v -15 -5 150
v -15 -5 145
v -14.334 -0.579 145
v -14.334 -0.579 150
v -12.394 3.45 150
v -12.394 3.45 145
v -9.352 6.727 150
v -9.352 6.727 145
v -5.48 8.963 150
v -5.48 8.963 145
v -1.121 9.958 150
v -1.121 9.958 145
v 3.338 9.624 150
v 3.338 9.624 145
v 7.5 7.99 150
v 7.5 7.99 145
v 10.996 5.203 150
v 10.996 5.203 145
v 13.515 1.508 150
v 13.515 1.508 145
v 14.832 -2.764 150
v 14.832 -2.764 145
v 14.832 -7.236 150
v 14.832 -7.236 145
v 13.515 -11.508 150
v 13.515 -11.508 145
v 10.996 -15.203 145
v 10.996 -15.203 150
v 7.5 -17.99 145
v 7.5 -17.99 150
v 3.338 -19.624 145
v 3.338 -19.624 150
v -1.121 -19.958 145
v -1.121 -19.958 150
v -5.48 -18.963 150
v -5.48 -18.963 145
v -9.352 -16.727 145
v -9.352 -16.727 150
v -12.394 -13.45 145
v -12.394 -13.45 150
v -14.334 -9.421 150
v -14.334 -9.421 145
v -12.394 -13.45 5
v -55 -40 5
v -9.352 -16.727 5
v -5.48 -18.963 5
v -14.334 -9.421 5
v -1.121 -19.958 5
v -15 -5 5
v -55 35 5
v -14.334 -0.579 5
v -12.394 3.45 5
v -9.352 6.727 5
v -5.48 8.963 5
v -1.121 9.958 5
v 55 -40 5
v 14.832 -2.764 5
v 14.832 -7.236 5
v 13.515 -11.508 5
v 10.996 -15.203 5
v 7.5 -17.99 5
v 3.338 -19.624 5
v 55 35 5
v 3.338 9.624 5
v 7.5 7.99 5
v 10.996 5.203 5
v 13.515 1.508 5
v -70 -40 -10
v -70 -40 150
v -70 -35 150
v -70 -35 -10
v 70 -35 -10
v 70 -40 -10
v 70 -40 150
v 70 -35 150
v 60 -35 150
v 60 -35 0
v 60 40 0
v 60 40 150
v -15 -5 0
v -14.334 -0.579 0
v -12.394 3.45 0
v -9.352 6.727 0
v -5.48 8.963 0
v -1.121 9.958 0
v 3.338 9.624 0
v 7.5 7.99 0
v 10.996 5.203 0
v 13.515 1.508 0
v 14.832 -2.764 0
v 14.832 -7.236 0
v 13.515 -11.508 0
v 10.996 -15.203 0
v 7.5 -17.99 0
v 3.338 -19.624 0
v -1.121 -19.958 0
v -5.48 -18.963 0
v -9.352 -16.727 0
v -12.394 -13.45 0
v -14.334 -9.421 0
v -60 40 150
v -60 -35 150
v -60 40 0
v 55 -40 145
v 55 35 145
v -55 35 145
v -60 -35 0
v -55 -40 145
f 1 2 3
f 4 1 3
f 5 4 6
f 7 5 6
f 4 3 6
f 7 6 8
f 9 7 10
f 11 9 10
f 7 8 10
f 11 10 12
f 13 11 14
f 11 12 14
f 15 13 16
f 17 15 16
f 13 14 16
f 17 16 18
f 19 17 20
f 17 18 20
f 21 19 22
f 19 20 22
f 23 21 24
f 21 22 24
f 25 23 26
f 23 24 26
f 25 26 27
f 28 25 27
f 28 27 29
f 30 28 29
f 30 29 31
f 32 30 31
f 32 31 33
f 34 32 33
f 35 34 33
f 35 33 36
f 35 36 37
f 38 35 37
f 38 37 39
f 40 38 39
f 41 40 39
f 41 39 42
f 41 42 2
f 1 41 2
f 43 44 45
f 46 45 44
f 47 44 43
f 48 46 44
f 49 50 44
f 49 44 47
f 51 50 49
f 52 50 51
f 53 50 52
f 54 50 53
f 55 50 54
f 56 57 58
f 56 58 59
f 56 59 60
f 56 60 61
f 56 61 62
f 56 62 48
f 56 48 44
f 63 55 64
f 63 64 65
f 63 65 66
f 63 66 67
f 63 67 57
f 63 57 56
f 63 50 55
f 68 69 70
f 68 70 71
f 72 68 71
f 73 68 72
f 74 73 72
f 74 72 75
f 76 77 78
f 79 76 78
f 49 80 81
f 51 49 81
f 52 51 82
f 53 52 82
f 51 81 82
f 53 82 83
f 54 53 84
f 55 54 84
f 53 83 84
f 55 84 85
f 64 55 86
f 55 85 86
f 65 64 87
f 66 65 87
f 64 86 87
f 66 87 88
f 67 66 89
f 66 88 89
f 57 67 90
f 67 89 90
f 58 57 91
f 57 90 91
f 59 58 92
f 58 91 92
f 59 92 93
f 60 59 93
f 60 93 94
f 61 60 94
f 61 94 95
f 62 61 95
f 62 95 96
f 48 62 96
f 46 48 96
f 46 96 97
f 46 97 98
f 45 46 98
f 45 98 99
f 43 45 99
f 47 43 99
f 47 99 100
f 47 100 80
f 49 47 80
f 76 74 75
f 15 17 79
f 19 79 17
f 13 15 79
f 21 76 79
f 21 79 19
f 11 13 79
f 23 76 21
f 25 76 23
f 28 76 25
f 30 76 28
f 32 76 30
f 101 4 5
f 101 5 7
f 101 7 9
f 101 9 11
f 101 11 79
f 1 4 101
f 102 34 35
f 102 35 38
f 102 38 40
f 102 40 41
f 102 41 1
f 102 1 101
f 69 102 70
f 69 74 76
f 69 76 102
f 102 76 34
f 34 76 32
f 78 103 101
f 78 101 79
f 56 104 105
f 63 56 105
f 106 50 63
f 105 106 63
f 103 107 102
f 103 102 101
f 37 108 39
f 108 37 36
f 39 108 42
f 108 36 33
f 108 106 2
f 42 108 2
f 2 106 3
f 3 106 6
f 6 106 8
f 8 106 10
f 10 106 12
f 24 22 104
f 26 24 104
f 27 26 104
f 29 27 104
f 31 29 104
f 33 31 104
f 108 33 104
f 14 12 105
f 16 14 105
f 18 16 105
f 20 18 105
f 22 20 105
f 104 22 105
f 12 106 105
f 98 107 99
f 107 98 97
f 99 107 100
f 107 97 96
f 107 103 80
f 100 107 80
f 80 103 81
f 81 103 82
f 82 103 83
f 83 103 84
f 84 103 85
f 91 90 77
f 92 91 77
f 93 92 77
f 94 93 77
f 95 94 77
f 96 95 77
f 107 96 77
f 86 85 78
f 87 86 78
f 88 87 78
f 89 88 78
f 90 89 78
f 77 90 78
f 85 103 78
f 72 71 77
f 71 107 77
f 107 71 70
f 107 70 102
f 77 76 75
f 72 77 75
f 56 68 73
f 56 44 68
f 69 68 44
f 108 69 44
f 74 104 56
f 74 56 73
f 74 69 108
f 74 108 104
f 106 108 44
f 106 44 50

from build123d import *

# Parameters (mm, degrees)
SKETCH_1_W          = 120
SKETCH_1_H          = 80
EXTRUDE_1_DEPTH     = 150
SHELL_1_T           = -5
EXTRUDE_2_DEPTH     = 5
SKETCH_3_R          = 15
CUT_EXTRUDE_1_DEPTH = 10000


with BuildPart() as part:
    # 草图1 → 凸台-拉伸1 (new body)
    with BuildSketch(Plane.XY):
        Rectangle(SKETCH_1_W, SKETCH_1_H)
    extrude(amount=EXTRUDE_1_DEPTH)

    # 抽壳1
    shell_1_openings = [part.faces().sort_by_distance(p)[0] for p in [
        (0, -40, 75),
    ]]
    offset(amount=SHELL_1_T, openings=shell_1_openings, kind=Kind.INTERSECTION)

    # 草图2 → 凸台-拉伸2 (add)
    with BuildSketch(Plane.XZ.offset(40)):
        Polygon((-60, 150), (-70, 150), (-70, -10), (70, -10), (70, 150), (60, 150), (60, 0), (-60, 0), align=None)
    extrude(amount=-EXTRUDE_2_DEPTH)

    # 草图3 → 切除-拉伸1 (cut)
    with BuildSketch(Plane(origin=(0, 0, 0), x_dir=(-1, 0, 0), z_dir=(0, 0, -1))):
        with Locations((0, -5)):
            Circle(SKETCH_3_R)
    extrude(amount=-CUT_EXTRUDE_1_DEPTH, mode=Mode.SUBTRACT)


solid = part.part
